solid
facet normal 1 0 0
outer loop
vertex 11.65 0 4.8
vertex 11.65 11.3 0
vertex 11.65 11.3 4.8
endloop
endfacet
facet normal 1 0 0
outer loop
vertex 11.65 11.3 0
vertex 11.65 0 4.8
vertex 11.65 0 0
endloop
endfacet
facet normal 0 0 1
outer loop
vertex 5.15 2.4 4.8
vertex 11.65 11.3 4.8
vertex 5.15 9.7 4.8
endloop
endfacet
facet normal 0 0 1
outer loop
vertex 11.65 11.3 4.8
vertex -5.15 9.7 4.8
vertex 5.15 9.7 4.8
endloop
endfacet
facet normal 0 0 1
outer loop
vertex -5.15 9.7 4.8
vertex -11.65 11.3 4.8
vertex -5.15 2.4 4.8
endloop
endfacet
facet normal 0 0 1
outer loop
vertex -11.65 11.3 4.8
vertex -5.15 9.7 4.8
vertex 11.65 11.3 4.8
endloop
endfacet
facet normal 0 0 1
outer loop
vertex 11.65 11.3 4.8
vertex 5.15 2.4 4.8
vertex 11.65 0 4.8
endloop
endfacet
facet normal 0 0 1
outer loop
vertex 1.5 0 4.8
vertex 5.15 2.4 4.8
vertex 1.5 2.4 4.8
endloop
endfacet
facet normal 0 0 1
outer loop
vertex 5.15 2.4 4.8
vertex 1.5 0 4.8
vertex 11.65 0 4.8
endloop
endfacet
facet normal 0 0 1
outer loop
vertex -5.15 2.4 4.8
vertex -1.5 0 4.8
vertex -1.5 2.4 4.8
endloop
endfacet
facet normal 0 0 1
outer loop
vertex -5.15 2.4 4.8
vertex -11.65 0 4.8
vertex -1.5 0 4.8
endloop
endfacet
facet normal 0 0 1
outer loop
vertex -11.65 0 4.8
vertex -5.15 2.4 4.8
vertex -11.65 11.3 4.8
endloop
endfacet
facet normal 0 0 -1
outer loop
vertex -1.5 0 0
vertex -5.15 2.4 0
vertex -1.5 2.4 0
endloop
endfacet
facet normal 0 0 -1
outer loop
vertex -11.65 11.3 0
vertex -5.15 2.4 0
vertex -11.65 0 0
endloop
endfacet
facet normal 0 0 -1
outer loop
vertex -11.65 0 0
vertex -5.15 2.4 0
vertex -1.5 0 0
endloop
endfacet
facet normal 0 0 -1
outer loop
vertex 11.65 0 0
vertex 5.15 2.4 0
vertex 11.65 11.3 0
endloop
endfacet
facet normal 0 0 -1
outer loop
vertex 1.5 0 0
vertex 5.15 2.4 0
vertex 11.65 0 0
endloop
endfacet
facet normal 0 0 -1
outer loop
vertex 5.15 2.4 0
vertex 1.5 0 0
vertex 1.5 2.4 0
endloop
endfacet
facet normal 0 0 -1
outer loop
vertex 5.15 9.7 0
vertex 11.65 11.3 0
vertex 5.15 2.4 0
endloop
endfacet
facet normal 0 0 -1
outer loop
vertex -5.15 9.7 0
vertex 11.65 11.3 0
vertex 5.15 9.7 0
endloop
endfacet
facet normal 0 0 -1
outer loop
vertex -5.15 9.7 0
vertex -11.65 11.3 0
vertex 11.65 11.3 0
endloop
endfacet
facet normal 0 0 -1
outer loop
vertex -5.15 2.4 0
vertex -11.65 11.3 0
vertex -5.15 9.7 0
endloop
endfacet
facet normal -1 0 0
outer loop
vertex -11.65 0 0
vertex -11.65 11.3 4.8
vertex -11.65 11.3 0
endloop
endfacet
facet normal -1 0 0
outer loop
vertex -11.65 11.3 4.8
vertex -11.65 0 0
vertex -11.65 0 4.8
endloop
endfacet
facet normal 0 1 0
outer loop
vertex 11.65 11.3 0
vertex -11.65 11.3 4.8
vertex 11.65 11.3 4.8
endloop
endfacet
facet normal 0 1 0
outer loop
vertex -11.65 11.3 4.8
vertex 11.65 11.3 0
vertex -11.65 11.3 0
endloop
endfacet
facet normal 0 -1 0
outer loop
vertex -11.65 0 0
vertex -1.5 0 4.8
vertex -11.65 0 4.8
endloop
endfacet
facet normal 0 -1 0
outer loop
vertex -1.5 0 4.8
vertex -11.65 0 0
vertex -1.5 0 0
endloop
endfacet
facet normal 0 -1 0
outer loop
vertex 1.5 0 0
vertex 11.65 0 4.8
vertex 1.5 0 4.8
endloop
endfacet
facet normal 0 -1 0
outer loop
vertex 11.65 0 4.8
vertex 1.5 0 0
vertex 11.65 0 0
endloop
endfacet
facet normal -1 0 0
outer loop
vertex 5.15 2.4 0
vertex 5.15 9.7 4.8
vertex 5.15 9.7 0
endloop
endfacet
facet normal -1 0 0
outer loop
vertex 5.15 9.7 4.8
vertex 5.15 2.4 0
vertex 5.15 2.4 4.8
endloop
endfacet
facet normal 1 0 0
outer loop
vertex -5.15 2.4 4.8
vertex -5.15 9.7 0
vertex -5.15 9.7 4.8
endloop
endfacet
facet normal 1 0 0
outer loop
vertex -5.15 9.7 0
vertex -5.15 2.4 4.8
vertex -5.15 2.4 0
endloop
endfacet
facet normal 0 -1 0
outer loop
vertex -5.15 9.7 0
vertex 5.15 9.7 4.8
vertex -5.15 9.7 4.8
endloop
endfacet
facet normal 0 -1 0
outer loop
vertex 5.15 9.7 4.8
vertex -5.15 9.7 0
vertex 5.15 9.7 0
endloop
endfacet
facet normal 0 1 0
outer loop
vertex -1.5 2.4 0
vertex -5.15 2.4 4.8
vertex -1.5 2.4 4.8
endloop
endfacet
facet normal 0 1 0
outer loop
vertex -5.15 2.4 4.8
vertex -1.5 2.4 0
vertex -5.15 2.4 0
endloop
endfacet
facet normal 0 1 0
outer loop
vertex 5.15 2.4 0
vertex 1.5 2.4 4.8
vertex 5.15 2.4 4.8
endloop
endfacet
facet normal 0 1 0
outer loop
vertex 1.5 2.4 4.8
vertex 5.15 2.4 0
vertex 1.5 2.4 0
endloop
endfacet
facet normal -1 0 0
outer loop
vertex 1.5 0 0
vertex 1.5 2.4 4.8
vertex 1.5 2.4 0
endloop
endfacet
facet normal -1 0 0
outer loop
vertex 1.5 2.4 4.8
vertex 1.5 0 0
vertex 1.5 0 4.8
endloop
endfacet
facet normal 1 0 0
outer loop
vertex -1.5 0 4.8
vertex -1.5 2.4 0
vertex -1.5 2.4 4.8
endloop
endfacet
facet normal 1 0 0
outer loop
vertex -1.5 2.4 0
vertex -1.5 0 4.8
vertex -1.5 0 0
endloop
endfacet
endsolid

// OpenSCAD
// USB plug width
uW = 10.3;

// USB plug depth
uD = 7.3;

// Separation from phone back
uS = 2.4;


/* [ Hidden ] */
fH= 3;

wF = 23.3;
dF = 11.3;
hF = 4.8;


difference() {
translate ([-wF/2, 0, 0])
cube([wF, dF, hF]);
translate([-uW/2, uS, -1])
cube ([uW, uD, hF+2]);
translate([-fH/2, -1, -1])
cube([fH, uS+2, hF+2]);
}
